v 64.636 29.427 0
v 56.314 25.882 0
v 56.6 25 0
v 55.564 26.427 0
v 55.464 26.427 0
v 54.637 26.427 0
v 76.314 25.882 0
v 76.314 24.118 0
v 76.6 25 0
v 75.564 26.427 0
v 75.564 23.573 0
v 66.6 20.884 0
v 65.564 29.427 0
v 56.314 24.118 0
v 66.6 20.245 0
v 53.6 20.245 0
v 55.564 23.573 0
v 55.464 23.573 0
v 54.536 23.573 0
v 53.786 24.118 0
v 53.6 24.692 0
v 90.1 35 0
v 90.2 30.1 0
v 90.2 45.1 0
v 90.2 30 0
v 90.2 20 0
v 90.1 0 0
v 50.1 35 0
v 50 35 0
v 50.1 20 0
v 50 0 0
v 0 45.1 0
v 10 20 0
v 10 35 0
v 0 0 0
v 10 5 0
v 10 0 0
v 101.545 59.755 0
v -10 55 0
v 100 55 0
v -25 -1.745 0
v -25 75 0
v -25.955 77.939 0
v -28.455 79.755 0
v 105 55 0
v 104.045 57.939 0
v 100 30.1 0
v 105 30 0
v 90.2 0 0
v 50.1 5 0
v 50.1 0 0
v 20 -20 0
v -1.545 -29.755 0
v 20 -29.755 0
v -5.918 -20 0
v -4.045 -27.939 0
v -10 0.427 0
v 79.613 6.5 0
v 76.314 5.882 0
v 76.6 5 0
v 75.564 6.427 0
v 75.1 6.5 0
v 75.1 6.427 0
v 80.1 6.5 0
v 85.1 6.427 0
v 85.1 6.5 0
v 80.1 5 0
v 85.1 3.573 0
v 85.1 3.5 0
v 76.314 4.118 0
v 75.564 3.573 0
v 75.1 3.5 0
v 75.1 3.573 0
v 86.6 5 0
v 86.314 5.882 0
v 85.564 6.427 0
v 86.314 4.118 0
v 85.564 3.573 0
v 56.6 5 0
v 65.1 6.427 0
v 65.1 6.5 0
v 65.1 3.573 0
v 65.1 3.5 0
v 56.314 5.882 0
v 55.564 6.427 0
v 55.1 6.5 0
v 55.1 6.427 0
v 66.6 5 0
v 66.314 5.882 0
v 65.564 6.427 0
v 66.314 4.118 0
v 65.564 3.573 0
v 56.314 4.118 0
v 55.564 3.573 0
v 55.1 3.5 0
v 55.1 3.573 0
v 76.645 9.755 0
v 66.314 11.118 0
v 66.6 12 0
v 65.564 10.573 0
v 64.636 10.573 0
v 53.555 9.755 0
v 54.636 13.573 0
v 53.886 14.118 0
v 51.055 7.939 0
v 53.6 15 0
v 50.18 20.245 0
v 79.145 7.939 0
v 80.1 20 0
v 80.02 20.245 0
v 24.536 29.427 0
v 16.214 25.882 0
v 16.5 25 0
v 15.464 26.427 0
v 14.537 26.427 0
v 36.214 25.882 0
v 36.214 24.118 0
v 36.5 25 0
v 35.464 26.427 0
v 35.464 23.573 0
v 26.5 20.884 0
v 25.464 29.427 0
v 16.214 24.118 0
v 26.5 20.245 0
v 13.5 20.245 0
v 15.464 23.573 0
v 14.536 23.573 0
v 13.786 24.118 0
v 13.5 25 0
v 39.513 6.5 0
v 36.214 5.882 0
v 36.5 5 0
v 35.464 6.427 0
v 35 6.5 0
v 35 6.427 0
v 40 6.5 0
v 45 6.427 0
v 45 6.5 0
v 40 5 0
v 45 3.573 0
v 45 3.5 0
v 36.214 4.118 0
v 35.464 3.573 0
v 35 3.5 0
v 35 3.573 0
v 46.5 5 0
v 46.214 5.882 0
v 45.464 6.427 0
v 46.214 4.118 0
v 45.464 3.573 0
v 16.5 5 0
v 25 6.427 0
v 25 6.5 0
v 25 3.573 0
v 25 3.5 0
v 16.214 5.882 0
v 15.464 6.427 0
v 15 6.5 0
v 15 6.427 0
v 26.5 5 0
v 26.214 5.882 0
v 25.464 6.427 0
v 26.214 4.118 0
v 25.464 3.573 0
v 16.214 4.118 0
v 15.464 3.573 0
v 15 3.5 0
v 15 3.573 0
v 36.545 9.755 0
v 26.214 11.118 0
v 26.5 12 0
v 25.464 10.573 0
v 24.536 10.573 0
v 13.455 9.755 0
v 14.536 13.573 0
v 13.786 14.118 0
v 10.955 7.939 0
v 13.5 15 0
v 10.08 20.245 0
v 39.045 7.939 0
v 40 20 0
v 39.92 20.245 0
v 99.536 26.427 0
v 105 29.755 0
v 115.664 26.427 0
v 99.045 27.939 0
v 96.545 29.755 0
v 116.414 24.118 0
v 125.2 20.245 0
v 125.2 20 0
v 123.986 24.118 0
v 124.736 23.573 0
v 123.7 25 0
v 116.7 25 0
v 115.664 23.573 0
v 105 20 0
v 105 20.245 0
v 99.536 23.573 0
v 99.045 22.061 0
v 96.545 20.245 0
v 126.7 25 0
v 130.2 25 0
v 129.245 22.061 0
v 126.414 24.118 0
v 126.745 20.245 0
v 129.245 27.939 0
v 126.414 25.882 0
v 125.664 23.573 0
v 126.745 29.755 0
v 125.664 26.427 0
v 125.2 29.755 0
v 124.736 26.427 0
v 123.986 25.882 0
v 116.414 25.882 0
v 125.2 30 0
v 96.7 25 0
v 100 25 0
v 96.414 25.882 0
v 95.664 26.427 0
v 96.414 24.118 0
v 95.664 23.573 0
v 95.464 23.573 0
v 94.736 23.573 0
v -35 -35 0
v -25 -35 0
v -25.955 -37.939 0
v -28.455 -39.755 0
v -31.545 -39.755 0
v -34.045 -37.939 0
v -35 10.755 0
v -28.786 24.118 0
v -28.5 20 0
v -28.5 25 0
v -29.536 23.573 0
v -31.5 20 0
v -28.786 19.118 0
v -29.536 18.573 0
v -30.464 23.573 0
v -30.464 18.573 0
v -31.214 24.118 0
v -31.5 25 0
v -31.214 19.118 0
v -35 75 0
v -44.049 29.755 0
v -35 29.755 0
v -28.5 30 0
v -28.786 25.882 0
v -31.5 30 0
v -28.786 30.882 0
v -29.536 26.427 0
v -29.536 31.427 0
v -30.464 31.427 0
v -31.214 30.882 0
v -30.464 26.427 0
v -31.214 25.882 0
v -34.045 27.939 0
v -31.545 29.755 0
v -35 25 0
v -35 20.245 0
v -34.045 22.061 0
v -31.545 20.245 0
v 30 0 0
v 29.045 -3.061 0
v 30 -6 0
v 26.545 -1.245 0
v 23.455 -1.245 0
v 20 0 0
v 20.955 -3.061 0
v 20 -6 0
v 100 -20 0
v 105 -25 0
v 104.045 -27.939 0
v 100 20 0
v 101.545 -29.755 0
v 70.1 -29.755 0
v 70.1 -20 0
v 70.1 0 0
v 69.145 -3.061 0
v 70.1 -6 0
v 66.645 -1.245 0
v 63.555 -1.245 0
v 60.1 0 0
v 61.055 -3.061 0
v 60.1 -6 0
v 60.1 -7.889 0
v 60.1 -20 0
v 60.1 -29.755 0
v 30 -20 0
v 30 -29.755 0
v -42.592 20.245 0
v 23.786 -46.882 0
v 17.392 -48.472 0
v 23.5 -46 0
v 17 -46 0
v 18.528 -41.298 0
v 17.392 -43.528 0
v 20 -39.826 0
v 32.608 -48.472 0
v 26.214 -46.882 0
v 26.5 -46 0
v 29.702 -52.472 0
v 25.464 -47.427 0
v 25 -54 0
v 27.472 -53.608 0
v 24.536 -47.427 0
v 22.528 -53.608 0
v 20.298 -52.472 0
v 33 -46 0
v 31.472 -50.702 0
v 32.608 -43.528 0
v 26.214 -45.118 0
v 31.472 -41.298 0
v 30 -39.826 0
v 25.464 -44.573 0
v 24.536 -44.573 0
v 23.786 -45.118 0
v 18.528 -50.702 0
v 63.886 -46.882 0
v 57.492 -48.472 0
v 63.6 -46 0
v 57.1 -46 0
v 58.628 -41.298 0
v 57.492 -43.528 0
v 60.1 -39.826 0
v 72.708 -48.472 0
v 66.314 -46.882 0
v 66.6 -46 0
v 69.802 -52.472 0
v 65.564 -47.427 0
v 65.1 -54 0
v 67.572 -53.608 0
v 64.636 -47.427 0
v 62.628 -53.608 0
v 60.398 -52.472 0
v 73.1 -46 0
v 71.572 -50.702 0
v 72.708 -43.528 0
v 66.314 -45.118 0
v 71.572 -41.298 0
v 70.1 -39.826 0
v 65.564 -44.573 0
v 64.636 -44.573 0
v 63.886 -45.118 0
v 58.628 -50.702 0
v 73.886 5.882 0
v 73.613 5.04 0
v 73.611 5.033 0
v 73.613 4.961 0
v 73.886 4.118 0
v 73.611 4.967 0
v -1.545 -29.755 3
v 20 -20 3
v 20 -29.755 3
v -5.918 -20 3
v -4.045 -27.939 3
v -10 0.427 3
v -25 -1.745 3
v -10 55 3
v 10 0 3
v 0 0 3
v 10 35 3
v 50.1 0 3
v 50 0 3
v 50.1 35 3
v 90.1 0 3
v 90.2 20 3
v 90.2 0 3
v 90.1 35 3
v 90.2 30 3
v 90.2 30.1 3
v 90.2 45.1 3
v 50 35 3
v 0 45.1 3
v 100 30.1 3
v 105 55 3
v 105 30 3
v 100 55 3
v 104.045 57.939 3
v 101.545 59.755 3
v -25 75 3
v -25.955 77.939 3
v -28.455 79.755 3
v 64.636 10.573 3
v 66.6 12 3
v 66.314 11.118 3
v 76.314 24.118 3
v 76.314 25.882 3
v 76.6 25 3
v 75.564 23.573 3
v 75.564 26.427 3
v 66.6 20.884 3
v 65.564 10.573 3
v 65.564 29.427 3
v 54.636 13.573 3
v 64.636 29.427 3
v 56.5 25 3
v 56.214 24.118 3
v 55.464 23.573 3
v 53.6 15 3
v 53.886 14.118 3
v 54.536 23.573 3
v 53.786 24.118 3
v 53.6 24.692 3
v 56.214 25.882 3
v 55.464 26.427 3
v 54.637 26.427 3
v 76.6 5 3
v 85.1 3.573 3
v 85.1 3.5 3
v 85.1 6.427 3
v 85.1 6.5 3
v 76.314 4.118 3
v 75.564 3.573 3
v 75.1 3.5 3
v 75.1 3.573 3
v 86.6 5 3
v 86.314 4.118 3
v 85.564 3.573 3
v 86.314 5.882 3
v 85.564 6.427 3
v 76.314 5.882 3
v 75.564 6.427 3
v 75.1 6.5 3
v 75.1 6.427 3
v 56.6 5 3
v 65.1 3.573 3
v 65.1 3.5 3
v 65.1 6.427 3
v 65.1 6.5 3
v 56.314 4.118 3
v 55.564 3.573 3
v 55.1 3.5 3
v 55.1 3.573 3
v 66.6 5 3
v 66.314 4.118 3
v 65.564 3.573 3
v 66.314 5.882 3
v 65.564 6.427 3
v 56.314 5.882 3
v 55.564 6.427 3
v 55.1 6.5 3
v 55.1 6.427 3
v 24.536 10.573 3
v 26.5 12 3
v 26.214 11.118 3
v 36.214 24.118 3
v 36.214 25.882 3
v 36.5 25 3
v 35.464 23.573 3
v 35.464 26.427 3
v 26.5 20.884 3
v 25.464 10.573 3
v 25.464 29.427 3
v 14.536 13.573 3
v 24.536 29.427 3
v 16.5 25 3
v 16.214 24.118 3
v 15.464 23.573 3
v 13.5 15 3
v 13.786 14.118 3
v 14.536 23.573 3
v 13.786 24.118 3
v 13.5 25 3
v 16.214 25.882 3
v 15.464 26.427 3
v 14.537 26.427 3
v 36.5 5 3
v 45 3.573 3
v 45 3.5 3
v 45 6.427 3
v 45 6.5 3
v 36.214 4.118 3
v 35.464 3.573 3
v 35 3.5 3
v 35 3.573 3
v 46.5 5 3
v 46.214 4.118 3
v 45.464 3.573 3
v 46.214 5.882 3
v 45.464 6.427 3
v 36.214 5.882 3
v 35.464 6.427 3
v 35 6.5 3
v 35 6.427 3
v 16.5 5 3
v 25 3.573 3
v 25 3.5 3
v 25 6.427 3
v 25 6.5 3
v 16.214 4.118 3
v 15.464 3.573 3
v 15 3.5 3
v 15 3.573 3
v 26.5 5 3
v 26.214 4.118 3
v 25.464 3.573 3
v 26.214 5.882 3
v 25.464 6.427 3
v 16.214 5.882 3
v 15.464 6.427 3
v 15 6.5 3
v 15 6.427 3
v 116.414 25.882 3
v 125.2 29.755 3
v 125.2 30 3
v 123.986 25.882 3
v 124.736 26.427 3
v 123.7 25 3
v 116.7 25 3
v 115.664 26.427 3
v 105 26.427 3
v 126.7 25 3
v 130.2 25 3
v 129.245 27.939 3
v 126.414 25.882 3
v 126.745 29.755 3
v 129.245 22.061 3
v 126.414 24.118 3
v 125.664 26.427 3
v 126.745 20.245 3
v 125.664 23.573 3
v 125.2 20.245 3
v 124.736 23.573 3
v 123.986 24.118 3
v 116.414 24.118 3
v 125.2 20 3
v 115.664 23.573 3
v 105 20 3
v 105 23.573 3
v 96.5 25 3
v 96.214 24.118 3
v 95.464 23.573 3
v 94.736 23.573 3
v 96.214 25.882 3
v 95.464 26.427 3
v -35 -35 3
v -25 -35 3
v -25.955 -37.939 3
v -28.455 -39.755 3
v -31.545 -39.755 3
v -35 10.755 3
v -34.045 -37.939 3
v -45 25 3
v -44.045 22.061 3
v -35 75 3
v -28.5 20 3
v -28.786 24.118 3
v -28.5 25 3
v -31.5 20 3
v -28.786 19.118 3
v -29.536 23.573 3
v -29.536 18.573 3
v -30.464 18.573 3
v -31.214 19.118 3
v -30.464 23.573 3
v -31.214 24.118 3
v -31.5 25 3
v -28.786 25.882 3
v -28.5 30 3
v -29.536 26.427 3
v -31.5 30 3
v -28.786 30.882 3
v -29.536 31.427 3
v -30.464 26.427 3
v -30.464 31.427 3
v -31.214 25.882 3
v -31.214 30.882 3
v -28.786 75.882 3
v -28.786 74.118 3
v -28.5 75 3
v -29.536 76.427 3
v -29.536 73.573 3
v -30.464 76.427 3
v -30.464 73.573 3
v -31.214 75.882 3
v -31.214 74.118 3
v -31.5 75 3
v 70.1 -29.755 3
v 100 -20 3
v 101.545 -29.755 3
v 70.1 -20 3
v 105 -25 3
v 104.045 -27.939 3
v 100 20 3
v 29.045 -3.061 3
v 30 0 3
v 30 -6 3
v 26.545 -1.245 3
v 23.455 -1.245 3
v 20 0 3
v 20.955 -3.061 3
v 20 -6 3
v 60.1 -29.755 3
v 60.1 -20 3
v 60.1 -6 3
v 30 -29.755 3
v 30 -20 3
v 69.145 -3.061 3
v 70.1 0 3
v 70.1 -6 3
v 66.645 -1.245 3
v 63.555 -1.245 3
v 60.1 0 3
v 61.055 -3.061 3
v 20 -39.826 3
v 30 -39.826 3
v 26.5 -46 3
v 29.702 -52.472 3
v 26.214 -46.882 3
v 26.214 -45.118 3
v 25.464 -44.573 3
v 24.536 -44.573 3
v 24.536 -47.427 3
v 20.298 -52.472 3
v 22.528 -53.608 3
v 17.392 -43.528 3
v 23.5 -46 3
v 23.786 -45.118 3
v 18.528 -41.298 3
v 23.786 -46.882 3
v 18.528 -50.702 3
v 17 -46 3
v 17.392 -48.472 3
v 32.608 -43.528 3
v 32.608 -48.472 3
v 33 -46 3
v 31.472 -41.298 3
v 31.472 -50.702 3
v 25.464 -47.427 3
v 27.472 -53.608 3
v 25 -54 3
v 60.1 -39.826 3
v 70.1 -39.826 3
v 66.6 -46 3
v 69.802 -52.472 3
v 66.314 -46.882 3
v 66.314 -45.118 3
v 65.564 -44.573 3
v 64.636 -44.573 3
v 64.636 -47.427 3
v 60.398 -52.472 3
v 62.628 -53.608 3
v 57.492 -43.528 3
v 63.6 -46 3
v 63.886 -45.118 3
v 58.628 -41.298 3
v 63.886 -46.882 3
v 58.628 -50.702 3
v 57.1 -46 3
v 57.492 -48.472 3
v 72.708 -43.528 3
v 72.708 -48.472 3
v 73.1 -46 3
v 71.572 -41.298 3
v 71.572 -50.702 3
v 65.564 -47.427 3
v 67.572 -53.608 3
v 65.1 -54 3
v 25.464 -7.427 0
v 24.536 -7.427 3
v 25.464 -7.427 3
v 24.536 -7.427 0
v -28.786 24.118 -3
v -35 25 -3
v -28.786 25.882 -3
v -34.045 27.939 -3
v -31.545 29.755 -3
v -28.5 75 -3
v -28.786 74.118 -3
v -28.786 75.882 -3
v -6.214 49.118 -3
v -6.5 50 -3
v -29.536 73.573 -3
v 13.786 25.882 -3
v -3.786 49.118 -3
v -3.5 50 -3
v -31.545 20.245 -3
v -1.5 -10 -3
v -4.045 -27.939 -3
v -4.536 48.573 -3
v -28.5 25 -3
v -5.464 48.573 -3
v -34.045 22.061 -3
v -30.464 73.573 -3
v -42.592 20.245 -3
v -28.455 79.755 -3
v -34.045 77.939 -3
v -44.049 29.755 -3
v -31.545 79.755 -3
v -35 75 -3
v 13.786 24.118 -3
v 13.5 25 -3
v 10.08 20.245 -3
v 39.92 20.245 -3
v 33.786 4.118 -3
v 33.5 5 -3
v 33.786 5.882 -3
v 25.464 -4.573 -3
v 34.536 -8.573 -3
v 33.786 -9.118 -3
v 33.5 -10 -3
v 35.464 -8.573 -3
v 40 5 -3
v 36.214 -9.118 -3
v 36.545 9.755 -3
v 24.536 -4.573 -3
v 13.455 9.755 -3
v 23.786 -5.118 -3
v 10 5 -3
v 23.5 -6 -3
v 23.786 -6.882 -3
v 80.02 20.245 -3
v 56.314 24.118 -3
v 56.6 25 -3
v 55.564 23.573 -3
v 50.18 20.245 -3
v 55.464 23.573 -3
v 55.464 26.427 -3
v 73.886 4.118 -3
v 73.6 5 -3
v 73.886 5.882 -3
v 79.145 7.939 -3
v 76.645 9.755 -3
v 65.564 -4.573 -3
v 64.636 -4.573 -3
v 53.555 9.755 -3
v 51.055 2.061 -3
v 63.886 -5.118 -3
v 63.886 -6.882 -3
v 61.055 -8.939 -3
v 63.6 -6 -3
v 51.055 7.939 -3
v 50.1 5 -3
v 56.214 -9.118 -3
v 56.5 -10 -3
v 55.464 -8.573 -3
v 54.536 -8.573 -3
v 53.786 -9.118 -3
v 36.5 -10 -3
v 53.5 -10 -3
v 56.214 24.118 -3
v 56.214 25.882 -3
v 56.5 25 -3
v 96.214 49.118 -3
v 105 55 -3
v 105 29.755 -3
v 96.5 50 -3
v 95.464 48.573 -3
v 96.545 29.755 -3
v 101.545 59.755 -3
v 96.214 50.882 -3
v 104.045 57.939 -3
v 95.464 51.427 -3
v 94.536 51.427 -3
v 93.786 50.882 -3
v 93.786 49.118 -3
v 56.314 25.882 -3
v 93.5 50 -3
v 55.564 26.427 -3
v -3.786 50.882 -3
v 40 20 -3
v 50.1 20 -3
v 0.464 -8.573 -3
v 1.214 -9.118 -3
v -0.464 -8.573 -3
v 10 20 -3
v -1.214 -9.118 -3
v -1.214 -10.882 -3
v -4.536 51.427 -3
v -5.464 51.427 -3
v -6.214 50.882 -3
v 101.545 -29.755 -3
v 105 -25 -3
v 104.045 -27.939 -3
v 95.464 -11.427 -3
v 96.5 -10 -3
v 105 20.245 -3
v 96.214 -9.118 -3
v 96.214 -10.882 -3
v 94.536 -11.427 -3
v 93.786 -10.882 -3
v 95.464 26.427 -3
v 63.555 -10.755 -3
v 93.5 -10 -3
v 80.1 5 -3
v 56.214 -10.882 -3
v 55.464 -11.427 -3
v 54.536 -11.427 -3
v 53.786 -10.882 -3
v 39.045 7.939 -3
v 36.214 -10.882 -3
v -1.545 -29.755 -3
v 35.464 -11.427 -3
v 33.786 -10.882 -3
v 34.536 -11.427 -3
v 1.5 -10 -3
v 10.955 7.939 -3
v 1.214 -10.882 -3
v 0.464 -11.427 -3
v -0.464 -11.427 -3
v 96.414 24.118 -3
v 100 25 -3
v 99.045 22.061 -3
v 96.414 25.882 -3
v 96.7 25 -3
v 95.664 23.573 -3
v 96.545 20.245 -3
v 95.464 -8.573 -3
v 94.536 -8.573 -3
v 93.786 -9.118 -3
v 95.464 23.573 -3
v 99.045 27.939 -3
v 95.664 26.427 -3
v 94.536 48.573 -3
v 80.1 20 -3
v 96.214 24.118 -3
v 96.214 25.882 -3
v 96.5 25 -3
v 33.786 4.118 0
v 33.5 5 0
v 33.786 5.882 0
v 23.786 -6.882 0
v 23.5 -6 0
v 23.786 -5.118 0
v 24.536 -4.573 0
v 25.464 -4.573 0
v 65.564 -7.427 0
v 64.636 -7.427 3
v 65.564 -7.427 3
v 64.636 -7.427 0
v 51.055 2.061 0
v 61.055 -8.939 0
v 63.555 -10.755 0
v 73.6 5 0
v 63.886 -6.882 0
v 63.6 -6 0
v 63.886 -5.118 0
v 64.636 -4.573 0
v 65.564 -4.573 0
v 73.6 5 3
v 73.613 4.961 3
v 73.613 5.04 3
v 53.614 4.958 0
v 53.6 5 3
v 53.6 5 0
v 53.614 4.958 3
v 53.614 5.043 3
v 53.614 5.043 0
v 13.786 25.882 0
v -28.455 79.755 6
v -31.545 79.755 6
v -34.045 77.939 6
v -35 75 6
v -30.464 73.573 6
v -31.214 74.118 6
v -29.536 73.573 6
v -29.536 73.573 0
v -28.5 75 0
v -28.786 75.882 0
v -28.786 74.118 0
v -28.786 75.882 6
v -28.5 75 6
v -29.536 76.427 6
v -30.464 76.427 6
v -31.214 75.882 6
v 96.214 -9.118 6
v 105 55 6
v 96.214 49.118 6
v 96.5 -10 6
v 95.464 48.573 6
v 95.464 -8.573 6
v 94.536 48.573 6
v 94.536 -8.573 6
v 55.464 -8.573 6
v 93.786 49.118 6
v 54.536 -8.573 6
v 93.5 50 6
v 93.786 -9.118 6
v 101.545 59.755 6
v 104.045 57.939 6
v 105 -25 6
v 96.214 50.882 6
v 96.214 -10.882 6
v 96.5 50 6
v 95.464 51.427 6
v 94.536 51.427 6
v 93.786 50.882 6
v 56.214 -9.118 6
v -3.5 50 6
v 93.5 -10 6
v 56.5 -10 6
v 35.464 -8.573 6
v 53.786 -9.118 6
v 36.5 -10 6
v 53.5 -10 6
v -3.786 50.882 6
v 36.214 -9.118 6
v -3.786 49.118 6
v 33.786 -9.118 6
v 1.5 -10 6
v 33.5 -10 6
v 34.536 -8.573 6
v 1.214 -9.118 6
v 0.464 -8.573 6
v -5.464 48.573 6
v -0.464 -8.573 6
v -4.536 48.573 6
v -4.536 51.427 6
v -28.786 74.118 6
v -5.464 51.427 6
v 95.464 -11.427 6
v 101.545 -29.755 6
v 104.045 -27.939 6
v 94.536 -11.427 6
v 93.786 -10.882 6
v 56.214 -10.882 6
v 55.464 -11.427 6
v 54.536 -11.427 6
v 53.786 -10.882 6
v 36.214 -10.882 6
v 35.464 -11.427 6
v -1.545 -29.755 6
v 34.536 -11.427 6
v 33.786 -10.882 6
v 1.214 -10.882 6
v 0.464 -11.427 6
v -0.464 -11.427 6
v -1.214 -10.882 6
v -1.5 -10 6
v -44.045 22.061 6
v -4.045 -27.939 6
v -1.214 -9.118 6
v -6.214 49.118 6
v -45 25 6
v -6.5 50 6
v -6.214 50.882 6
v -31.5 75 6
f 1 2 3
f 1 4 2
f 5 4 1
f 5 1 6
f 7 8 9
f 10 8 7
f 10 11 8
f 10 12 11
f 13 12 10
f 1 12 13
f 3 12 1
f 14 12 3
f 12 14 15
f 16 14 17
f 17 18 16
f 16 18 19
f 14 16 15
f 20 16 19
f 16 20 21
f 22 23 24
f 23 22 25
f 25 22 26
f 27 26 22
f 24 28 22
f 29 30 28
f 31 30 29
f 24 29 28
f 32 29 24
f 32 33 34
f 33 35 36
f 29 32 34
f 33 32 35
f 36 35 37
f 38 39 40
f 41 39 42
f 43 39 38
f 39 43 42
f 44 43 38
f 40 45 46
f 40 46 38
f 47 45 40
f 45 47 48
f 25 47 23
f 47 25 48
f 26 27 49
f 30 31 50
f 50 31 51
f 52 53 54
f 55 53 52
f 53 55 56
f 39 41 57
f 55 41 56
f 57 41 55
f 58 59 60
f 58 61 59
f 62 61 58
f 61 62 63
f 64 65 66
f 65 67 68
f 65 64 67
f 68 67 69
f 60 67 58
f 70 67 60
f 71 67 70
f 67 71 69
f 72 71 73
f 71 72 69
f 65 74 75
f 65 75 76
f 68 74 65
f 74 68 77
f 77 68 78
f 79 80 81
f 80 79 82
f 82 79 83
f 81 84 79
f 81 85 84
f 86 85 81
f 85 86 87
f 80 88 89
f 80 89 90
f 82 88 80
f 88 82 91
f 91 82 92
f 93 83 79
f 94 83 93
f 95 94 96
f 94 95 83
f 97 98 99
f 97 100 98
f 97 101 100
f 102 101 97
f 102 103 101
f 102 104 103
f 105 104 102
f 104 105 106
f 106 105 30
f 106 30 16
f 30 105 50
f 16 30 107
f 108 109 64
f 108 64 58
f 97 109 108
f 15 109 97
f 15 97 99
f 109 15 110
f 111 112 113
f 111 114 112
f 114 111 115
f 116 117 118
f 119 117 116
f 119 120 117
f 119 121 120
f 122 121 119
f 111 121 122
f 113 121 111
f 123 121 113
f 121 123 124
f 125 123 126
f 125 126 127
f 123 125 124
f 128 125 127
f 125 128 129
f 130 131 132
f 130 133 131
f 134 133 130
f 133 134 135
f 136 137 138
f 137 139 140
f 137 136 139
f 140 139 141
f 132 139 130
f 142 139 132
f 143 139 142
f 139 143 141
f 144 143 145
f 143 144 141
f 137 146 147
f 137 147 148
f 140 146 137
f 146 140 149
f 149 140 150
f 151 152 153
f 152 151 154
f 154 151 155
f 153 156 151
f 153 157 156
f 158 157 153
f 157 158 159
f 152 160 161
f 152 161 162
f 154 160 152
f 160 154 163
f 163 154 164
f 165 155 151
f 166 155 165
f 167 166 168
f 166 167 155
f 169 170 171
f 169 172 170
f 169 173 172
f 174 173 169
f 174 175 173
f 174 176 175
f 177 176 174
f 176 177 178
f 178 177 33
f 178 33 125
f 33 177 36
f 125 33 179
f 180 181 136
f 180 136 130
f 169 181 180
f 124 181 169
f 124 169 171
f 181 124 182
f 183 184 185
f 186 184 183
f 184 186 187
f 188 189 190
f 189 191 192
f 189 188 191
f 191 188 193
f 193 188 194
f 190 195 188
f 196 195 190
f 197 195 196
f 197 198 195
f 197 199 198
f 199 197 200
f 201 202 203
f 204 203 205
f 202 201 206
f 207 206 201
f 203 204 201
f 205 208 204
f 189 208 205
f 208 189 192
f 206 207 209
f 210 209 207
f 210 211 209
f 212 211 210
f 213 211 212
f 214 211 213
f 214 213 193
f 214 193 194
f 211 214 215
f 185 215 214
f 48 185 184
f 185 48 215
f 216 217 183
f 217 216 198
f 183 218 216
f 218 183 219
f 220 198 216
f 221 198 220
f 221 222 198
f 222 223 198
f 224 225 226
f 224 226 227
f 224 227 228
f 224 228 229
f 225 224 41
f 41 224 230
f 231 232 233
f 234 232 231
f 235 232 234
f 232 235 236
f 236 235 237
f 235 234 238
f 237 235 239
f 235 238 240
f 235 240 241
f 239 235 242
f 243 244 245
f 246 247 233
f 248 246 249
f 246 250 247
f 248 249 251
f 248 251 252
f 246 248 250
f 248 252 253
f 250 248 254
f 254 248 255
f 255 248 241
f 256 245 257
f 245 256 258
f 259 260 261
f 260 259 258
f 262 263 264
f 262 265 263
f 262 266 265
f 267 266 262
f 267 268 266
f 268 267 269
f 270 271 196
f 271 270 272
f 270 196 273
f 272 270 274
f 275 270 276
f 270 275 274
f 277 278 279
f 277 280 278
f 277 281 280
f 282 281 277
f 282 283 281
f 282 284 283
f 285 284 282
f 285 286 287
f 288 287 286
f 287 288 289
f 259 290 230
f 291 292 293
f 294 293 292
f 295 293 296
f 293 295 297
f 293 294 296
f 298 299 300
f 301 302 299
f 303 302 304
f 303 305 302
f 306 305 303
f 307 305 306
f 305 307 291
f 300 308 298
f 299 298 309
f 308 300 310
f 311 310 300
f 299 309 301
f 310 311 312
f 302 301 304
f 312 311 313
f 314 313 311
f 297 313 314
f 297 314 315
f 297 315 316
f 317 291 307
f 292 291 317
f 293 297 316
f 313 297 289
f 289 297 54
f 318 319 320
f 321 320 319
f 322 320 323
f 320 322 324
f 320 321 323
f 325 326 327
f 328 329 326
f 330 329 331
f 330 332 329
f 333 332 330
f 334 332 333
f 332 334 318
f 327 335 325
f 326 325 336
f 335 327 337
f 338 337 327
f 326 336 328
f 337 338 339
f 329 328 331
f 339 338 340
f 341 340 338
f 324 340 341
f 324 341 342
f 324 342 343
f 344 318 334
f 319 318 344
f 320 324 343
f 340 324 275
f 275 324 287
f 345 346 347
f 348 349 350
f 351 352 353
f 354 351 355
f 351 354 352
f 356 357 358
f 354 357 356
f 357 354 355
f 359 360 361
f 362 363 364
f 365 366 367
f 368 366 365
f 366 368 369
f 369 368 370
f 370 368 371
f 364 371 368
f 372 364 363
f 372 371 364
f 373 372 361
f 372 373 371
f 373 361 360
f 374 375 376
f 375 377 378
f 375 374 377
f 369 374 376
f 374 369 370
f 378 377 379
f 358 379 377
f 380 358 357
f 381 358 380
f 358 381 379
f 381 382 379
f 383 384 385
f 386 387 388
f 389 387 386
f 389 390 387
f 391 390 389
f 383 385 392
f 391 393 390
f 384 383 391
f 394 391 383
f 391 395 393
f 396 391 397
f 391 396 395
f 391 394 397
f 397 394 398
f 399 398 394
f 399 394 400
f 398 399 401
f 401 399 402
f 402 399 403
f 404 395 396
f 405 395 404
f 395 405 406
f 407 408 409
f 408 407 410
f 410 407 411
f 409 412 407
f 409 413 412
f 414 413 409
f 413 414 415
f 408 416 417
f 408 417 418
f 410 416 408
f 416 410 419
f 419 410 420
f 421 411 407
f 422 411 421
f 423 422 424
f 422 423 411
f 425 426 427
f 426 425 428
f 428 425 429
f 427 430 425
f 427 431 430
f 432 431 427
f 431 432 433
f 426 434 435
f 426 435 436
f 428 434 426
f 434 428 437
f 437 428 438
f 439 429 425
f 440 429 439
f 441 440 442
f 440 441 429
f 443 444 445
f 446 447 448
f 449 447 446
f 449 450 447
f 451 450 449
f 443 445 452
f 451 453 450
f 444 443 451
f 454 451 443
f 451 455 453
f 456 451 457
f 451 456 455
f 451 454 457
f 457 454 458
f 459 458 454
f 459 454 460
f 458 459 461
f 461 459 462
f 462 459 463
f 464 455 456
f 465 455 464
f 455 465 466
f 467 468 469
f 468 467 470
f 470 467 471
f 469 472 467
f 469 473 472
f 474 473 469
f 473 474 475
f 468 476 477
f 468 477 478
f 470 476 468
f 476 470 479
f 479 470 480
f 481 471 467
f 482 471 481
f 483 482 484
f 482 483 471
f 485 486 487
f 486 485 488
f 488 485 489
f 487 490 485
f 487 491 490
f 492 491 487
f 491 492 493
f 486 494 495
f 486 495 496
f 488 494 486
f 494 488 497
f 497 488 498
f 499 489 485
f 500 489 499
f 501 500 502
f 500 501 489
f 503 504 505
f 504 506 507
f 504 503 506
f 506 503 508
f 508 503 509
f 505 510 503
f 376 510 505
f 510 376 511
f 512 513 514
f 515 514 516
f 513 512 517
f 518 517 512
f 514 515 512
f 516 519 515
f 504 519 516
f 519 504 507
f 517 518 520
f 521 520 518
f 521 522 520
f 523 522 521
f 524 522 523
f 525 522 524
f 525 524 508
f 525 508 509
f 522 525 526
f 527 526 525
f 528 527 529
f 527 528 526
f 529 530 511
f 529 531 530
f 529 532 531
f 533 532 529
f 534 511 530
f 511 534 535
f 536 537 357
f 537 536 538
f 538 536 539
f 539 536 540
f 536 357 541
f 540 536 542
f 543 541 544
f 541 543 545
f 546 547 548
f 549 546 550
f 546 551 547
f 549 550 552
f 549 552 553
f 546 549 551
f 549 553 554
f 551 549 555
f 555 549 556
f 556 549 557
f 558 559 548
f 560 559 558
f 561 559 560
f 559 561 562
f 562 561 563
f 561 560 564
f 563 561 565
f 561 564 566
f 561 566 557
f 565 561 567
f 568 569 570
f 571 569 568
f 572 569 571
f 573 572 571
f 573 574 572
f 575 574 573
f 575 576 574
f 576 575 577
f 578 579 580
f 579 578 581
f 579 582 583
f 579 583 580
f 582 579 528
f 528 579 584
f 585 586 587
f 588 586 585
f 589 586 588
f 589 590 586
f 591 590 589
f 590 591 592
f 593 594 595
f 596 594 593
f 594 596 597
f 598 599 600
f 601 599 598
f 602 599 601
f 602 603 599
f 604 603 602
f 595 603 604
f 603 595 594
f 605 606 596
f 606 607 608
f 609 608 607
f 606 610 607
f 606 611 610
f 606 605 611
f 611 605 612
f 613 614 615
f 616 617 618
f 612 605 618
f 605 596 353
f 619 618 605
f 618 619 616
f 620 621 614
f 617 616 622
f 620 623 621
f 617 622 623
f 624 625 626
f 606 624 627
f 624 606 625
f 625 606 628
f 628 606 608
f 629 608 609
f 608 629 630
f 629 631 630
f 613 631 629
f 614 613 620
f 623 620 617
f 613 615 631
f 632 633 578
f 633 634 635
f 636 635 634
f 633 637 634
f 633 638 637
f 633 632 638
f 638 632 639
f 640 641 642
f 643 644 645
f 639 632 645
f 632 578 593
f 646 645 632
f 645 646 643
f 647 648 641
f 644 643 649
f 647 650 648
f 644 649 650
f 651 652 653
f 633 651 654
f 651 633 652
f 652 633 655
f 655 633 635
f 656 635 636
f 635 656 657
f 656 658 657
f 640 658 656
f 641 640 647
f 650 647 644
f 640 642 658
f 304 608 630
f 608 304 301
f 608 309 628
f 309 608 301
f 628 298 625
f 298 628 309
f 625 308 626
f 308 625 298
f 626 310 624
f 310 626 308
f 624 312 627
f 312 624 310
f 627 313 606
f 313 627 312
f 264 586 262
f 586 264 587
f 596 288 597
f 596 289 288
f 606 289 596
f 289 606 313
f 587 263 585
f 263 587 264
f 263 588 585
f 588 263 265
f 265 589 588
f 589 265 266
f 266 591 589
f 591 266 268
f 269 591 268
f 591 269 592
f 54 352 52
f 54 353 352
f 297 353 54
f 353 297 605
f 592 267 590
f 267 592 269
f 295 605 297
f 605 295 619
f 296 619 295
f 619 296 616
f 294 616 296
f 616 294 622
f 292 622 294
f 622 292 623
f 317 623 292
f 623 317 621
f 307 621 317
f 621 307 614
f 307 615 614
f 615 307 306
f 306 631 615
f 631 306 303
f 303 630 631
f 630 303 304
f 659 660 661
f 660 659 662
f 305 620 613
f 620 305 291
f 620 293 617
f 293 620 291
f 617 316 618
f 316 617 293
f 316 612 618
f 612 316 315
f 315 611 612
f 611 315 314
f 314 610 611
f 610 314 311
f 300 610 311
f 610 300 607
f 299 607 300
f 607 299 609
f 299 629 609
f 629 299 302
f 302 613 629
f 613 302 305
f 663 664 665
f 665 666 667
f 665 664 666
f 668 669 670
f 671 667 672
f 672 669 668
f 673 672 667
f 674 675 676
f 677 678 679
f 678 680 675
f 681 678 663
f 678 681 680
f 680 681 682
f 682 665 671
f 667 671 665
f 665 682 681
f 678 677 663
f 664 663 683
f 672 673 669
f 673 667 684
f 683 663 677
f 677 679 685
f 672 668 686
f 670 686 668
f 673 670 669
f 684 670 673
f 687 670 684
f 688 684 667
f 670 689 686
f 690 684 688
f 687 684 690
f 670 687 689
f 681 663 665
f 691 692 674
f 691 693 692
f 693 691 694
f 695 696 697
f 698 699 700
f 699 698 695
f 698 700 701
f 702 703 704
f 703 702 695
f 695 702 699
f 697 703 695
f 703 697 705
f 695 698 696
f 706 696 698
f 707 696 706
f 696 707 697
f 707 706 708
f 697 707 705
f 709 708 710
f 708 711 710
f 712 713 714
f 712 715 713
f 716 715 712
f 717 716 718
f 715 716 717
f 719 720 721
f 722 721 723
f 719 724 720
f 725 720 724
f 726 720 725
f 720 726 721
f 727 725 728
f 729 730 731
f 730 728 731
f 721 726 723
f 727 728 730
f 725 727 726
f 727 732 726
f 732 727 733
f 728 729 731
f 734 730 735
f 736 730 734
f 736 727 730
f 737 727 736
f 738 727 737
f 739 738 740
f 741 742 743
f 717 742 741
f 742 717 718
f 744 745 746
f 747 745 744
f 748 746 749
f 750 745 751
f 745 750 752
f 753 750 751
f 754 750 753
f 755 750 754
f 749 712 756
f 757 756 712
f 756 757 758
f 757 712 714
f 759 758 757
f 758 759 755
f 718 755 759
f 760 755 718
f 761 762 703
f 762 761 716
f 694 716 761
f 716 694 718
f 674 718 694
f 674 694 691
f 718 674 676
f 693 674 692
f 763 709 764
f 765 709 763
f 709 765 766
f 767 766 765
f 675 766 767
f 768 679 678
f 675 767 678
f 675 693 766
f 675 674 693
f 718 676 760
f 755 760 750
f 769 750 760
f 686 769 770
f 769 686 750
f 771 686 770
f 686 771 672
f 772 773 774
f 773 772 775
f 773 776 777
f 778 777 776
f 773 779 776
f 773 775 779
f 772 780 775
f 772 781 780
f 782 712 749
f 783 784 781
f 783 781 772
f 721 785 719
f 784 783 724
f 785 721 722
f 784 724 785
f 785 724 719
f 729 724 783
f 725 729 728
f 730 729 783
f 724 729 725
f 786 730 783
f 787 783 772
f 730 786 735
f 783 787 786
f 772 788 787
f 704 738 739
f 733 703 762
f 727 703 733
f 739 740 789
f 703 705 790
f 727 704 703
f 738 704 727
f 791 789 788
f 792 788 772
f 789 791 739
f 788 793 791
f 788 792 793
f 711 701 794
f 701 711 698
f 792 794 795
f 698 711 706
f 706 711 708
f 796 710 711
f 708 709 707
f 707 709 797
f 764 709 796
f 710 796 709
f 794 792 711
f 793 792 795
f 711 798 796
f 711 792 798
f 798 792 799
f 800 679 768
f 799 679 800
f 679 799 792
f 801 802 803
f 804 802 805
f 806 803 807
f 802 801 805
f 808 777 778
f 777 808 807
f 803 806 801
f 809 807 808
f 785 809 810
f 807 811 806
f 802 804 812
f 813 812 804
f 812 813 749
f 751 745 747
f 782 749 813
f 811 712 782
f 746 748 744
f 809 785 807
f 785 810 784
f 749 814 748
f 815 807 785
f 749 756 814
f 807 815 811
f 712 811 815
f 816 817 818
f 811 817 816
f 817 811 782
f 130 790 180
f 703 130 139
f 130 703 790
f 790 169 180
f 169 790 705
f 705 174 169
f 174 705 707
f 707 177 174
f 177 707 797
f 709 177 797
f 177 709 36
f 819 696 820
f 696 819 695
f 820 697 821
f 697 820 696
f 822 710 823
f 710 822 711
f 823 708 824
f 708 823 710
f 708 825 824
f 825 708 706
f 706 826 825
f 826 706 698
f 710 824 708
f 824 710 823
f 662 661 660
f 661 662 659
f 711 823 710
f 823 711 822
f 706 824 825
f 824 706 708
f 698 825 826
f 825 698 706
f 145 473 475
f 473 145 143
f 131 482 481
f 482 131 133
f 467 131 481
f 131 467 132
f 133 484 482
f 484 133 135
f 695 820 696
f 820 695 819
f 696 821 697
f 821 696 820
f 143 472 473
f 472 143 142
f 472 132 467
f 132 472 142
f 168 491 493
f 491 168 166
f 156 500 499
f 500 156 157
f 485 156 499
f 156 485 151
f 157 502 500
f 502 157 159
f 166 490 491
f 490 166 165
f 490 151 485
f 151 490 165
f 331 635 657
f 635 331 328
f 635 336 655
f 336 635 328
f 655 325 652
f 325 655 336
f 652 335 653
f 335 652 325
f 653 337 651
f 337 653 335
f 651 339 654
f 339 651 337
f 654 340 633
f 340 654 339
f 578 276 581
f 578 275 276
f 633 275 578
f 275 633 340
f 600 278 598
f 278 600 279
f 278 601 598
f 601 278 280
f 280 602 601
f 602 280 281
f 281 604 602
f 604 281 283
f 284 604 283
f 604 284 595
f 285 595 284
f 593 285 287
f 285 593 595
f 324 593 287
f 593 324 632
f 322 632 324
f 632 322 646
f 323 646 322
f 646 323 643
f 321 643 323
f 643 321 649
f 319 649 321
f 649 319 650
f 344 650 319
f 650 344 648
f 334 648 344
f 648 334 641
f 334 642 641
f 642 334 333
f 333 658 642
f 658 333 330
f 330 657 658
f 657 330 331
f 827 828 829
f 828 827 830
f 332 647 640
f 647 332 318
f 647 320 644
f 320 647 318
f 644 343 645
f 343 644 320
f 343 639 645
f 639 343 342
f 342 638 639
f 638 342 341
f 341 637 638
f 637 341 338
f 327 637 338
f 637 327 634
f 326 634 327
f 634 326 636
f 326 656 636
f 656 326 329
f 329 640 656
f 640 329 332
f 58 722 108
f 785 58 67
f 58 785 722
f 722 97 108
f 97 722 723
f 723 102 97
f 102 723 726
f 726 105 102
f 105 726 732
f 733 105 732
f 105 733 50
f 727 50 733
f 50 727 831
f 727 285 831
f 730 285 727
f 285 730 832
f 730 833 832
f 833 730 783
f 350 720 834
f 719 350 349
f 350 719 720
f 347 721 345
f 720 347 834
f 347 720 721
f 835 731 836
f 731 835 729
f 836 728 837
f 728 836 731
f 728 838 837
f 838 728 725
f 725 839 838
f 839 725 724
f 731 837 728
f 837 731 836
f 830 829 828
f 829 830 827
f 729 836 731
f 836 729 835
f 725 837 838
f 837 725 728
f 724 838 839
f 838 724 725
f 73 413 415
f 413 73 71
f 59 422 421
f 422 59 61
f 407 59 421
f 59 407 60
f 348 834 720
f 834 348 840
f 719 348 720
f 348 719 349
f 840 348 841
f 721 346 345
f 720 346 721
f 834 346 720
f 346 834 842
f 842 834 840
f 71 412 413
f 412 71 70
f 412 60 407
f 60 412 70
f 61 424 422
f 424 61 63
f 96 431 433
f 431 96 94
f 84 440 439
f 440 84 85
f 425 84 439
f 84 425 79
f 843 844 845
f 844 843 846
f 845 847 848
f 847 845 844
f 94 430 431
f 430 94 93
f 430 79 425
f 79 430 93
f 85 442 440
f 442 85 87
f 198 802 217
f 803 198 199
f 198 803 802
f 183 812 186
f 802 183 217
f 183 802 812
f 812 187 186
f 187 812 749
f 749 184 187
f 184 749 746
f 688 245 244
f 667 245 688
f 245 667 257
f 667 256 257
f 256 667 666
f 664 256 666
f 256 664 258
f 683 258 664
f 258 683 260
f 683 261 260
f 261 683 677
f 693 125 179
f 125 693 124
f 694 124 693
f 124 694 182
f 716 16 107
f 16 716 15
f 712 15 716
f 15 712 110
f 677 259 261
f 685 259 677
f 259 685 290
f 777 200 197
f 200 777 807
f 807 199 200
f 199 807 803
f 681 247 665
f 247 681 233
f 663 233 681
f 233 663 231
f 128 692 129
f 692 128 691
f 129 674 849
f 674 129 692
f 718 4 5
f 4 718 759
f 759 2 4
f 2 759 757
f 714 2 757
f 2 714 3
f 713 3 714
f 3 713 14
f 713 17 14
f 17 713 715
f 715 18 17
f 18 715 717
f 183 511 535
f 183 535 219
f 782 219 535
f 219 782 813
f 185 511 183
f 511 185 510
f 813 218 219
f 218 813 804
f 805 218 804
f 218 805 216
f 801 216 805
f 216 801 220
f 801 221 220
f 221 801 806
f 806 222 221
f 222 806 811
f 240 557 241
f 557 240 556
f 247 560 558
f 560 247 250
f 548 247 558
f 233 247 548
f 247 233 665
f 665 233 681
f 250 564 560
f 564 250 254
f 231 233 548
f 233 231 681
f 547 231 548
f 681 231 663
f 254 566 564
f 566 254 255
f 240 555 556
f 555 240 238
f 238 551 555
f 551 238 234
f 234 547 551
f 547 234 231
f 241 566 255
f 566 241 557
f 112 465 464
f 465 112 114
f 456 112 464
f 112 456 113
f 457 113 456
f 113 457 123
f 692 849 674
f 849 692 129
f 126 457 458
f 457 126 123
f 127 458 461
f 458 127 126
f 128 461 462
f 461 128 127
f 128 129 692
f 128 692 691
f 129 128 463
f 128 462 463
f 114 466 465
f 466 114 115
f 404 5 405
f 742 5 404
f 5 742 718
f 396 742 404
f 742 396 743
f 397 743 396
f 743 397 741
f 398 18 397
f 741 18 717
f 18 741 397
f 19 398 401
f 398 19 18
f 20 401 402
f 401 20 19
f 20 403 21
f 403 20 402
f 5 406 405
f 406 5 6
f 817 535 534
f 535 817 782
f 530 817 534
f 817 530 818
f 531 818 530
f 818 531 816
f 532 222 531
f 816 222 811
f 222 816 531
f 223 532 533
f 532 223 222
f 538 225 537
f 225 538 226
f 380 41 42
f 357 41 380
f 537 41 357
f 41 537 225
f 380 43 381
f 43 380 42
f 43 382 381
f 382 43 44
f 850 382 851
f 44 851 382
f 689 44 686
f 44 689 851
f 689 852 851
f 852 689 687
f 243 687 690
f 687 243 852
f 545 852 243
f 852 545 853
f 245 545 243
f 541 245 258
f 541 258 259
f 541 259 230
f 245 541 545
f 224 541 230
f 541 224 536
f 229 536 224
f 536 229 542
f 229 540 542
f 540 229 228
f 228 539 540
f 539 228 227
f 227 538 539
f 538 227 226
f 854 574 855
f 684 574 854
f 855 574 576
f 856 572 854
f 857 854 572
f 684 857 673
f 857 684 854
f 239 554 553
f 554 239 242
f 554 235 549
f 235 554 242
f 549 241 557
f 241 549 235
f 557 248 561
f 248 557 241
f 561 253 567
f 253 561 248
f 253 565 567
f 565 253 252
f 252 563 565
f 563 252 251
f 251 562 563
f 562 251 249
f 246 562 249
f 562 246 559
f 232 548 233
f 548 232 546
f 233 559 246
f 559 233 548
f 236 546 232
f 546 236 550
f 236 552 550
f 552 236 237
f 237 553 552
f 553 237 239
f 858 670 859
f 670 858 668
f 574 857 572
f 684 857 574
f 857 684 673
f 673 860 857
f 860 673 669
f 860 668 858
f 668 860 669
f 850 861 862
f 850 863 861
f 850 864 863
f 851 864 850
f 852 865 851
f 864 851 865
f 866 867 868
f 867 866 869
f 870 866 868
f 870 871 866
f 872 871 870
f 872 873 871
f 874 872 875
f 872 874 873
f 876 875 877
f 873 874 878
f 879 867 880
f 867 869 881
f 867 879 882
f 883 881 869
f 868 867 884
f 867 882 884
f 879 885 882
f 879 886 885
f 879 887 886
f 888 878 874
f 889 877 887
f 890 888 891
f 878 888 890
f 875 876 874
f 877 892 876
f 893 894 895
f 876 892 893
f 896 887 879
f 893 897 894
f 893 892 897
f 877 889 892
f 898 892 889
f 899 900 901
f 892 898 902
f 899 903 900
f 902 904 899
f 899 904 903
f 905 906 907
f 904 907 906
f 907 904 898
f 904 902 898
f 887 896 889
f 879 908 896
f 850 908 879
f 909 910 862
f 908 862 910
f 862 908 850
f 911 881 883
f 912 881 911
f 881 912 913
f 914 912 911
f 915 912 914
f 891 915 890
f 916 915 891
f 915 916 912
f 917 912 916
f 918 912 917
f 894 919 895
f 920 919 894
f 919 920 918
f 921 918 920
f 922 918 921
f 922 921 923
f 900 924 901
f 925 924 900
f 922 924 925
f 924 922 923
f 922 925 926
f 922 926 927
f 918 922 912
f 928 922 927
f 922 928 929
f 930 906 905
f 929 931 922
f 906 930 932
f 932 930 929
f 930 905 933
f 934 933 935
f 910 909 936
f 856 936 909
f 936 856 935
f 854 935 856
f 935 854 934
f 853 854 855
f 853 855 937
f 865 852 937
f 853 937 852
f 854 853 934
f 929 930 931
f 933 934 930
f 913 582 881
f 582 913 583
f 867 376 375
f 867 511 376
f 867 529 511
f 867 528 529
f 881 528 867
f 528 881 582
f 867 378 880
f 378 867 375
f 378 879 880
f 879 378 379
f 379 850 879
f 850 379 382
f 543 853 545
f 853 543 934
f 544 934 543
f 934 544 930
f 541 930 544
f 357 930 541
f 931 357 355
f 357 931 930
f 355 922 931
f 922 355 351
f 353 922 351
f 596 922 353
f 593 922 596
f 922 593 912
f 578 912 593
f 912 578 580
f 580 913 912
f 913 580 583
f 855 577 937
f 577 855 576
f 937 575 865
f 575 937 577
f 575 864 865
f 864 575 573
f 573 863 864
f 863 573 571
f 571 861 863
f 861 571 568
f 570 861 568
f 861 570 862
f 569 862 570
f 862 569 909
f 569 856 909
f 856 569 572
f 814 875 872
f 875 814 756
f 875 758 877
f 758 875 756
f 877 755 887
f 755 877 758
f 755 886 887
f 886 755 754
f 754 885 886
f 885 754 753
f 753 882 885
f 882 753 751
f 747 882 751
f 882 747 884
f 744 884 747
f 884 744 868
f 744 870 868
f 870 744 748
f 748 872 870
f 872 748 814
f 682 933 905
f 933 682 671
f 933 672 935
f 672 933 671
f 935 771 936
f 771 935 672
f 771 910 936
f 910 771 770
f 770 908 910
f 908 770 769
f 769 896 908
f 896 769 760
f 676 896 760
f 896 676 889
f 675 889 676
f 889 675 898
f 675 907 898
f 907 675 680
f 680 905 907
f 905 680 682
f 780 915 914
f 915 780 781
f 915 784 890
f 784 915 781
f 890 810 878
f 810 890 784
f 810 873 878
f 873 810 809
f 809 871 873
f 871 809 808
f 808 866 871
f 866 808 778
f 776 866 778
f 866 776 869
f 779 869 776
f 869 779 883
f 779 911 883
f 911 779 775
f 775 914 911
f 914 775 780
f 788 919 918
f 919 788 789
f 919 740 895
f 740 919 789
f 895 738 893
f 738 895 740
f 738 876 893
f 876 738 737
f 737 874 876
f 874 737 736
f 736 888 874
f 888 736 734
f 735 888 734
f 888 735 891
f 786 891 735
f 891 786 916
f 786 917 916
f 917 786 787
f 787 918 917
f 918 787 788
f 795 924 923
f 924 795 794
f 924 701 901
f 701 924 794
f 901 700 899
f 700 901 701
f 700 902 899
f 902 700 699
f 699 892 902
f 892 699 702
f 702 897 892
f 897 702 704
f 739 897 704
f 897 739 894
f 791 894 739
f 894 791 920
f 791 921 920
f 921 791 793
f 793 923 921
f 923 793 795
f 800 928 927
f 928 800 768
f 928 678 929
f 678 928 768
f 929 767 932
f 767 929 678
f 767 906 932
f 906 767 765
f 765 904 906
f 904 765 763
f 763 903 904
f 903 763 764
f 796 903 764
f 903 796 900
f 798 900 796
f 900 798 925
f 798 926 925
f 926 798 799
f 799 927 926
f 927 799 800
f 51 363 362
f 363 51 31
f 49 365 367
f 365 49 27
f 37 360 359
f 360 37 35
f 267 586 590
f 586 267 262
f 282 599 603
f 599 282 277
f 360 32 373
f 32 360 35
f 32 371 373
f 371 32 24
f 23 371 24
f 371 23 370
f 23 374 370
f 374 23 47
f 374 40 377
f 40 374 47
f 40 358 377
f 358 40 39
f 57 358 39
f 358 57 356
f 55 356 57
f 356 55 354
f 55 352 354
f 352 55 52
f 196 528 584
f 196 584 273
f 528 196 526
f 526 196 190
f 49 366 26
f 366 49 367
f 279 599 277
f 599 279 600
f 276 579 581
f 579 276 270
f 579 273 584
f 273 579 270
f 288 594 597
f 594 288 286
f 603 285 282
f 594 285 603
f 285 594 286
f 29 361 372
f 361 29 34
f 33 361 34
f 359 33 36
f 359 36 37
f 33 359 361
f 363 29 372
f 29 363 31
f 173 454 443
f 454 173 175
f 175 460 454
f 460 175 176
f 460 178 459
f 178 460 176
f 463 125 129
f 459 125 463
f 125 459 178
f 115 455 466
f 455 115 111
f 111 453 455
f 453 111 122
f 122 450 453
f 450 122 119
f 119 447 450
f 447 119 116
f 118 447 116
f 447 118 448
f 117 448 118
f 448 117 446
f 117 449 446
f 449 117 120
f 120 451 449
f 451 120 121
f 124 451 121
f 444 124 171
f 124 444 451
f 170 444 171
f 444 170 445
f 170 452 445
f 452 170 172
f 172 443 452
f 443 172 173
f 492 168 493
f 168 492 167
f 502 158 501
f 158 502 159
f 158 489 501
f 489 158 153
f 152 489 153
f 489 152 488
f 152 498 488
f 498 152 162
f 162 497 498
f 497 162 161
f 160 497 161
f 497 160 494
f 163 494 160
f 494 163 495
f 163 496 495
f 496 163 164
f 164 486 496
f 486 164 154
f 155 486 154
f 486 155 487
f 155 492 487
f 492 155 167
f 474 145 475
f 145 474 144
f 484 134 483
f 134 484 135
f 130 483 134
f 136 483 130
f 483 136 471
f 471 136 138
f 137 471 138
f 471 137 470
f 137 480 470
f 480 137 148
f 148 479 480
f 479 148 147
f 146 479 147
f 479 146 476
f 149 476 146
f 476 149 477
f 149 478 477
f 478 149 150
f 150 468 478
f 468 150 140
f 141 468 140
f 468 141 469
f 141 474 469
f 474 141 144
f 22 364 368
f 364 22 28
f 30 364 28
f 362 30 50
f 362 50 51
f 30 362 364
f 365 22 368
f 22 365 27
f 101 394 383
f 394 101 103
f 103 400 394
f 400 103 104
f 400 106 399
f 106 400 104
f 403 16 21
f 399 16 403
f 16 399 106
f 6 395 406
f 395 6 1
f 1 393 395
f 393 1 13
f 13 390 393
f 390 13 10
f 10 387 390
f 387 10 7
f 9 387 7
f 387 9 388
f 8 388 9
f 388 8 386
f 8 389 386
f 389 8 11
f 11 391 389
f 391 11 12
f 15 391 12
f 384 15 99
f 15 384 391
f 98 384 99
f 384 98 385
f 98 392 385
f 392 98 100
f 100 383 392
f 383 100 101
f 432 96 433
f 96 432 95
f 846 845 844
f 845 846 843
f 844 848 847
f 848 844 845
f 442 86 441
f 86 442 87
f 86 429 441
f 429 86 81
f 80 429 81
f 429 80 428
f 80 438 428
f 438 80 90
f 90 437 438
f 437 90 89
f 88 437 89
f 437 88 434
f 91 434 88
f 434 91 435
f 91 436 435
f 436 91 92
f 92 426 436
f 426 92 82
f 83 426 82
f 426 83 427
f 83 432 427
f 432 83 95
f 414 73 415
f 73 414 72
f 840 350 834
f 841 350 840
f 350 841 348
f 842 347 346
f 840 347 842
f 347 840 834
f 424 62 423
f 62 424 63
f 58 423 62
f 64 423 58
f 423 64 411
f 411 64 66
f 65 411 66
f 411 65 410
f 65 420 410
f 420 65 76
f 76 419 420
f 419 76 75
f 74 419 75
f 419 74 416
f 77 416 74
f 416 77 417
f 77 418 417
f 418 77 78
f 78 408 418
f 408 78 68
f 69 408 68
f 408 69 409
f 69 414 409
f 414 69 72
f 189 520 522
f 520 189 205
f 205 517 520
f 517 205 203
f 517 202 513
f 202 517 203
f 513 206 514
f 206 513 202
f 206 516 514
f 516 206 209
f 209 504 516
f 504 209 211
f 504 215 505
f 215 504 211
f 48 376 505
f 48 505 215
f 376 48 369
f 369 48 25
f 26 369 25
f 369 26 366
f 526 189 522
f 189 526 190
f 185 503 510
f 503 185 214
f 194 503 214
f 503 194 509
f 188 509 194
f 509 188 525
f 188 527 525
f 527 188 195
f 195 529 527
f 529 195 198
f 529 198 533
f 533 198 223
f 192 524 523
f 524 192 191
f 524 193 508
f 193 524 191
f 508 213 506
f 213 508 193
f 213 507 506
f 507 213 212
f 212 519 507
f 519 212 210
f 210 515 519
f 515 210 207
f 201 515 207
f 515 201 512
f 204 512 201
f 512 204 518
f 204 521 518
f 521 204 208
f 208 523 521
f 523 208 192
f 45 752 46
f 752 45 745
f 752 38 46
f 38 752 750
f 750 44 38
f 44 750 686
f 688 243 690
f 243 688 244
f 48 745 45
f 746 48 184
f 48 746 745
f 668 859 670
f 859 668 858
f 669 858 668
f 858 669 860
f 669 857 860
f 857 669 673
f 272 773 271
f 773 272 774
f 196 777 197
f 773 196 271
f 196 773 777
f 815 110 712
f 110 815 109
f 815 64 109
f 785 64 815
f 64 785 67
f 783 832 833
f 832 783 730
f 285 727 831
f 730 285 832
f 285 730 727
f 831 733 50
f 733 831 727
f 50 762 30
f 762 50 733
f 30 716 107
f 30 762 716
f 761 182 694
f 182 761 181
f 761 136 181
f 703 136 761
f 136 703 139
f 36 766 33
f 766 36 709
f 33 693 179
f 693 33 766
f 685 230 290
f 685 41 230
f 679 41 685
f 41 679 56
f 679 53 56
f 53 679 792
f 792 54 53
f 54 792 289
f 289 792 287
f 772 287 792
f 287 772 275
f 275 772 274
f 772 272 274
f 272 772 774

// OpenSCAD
// file: orgate-twolayer.scad
$fn=10;
	
slotWidth = 3;
travel = 10;
clear = 0.1;
tolerance = 3;
sliderWidth = 40;
sliderHeight = 35;
inputLeverLen = 100;

module inputGateSlot()
{
  union() {
    circle(r=slotWidth/2);
    translate([travel,0]) circle(r=slotWidth/2);
    translate([0,-slotWidth/2]) square([travel,slotWidth]);
  }
}

module inputPasser(slot0, slot1)
{
  union() {
    hull() {
      translate([0,0]) circle(r=slotWidth/2);
      translate([0,travel]) circle(r=slotWidth/2);
      translate([travel,0-tolerance]) circle(r=slotWidth/2);
      translate([travel,travel+tolerance]) circle(r=slotWidth/2);
    }
    if(slot0 == 1) {
       hull() {
         translate([travel,0+tolerance]) circle(r=slotWidth/2);
         translate([travel,0-tolerance]) circle(r=slotWidth/2);
         translate([travel*2,0]) circle(r=slotWidth/2);
       }
    }
    if(slot1 == 1) {
       hull() {
       translate([travel,travel-tolerance]) circle(r=slotWidth/2);
       translate([travel,travel+tolerance]) circle(r=slotWidth/2);
       translate([travel*2,travel]) circle(r=slotWidth/2);
       }
    }
  }
}

module slider(slot0, slot1) {
  difference() {
    square([sliderWidth,sliderHeight]);
    translate([5,5]) inputGateSlot();
    translate([travel+15,5]) inputGateSlot();
    translate([5,15]) inputPasser(slot0, slot1);
  } 
}

module driverod() {
  difference() {
    hull() {
      translate([-30,0]) circle(r=5);
      translate([95,0]) circle(r=5);
    }   
    translate([-30,0]) circle(r=slotWidth/2);
    translate([5+travel,0]) circle(r=slotWidth/2);
    translate([sliderWidth+clear+5+travel,0]) circle(r=slotWidth/2);
    translate([sliderWidth*2+clear*2+5+travel,0]) circle(r=slotWidth/2);
  }
} 

module outputRod() {
  difference() {
    union() {
      square([35,10]);
      translate([35,5])circle(r=5);
    }
    hull() {
      translate([5,5]) circle(r=slotWidth/2);
      translate([5+travel*2,5]) circle(r=slotWidth/2);
    }
    translate([5+travel*3,5]) circle(r=slotWidth/2);
  }
}

module cell1() {
  slider(0,1);
}

module cell2() {
  translate([sliderWidth+clear,0]) slider(0,1);
}

module inputBridge() {
  difference() {
      hull() {
      translate([0,0]) circle(r=5);
      translate([travel+10,0]) circle(r=5);
      translate([travel/2+5,-11]) circle(r=5);
    }
    translate([travel/2+5,-11]) circle(r=slotWidth/2);
    translate([travel+10,0]) circle(r=slotWidth/2);
    translate([0,0]) circle(r=slotWidth/2);
  }
}

module inputRod() {
  difference() {
    union() {
      hull() {
	translate([0,-10]) circle(r=5);
	translate([0,30]) circle(r=5);
      }
      translate([0,-10]) circle(r=8, $fn=20);
    }
    translate([0,-10]) circle(r=slotWidth/2);
    translate([0,30]) circle(r=slotWidth/2);
  }
}



module inputLever() {
  translate([0,-inputLeverLen]) {
  difference() {
    hull() {
      translate([0,-10]) circle(r=5);
      translate([0,inputLeverLen]) circle(r=5);
    }
    translate([0,inputLeverLen]) circle(r=slotWidth/2);
    hull() {
      translate([0,45]) circle(r=slotWidth/2);
      translate([0,55]) circle(r=slotWidth/2);
    }
  }
  }
}


module caseHoles() {
    translate([95,-10]) circle(r=slotWidth/2);
    translate([95,50]) circle(r=slotWidth/2);
    translate([-5,50]) circle(r=slotWidth/2);

    translate([55,-10]) circle(r=slotWidth/2);
    translate([35,-10]) circle(r=slotWidth/2);
    translate([0,-10]) circle(r=slotWidth/2);
}

module case1() {
  difference() {
   translate([-10,-20]) square(size=[110,75]);
   square(size=[sliderWidth*2+clear*2+travel,sliderHeight+travel+clear]); // Central section
   translate([sliderWidth*2+clear*2,10+travel]) square(size=[100,10+clear]);
   for(i=[0:1]) {
     translate([10+travel+(sliderWidth+clear)*i,-30]) square(size=[10,50]); // Holes for input levers
   }
   translate([-30,inputLeverLen+5+travel*2-50]) rotate(11.3) inputLever();
   caseHoles();
  }
}

module basePlate() {
  difference() {
  hull() {
    translate([0,-25]) circle(r=5);
    translate([-40,25]) circle(r=5);
    translate([100,-25]) circle(r=5);
    translate([100,55]) circle(r=5);
    translate([-30,75]) circle(r=5);
  }
    translate([-30,75]) circle(r=slotWidth/2);
    caseHoles();
   }

}

module topPlate() {
  fudge=5;
  difference() {
    basePlate();
    for(i=[0:1]) {
      translate([5+i*(sliderWidth+clear),5]) {
	hull() {
	  for(v=[0:1]) {
	    translate([travel,v*(travel+fudge)]) inputBridge();
	  }
	}
      }
    }
   hull() {
      translate([-5,5+travel*2]) {
     for(v=[0:1]) {
       translate([v*(2*travel+fudge)-10,0]) driverod();
      }
     }
   }
    translate([-30,75]) circle(r=slotWidth/2);
    caseHoles();
  }
}
// main file
include <orgate-twolayer.scad>

// Animation variables
phase = ($t*4.0)%1.0;
PI=3.1415;
anim_driveRod = (phase < 0.8) ? -travel*sin(phase*1.25*360) : 0;
anim_driveLever = (phase < 0.8) ? -11.37*sin(phase*1.25*360) : 0;

input1 = ($t < 0.5)? 0: 1;
input2 = ($t % 0.5 < 0.25)?0:1;

old_time = ($t + 0.75) % 1.0;
next_time = ($t + 0.25) % 1.0;

prev_input1 = (old_time < 0.5)? 0: 1;
prev_input2 = (old_time % 0.5 < 0.25)? 0: 1;

next_input1 = (next_time < 0.5)? 0: 1;
next_input2 = (next_time % 0.5 < 0.25)? 0: 1;

input_either = (input1 + input2 > 0)?1:0;
prev_input_either = (prev_input1 + prev_input2 > 0)?1:0;

// In 'phase 5' blend between 
blend = 5*(phase - 0.8);
antiblend = 1-blend;
gate1v = phase > 0.8 ? (blend*next_input1 + antiblend*input1) : input1;
gate2v = phase > 0.8 ? (blend*next_input2 + antiblend*input2) : input2;

anim_gates = (phase < 0.20)? anim_driveRod + travel :
  (phase < 0.40) ? 0:
  (phase < 0.60) ? anim_driveRod:
  travel;

anim_gate1 = (phase < 0.4) ? anim_gates * prev_input1 : anim_gates * input1;
anim_gate2 = (phase < 0.4) ? anim_gates * prev_input_either : anim_gates * input_either;

anim_output = anim_gate2;


// Add dowels?
module dowel() {
  color([1,1,0]) translate([0,0,0]) cylinder(d=3,h=6);
}

// Acutal objects

translate([0,0,3]) color([0.5,0.5,0.5]) linear_extrude(height=3) basePlate();

color([0.0,0.8,0]) linear_extrude(height=3) case1();
translate([anim_gate1,travel*gate1v,0]) color([1.0,0,0]) linear_extrude(height=3) cell1();
translate([anim_gate2,travel*gate2v,0]) color([1.0,0,0]) linear_extrude(height=3) cell2();

translate([anim_output+sliderWidth*2+clear*2,15+travel-5]) linear_extrude(height=3) outputRod();  

translate([5+travel, 0, 0]) {
  translate([0,travel*gate1v,0]) {
    translate([10,-36,00]) color([0.0,0.0,1.0])  linear_extrude(height=3) inputRod();
    translate([0,5,-3]) color([0.0,0.5,1.0,0.5])  linear_extrude(height=3) inputBridge();
    translate([10,-6,-3]) dowel();
    translate([20,5,-3]) dowel();
    translate([0,5,-3]) dowel();

  }
  translate([sliderWidth+clear,travel*gate2v,0]) {
    translate([10,-36,0]) color([0.0,0.0,1.0])  linear_extrude(height=3) inputRod();
    translate([0,5,-3]) color([0.0,0.5,1.0,0.5])  linear_extrude(height=3) inputBridge();
    translate([10,-6,-3]) dowel();
    translate([20,5,-3]) dowel();
    translate([0,5,-3]) dowel();
  }
}
translate([anim_driveRod,5+travel*2,-3]) {
  color([0,0,1.0,0.5]) linear_extrude(height=3) driverod(); 
  translate([-30,0,0]) dowel();
  translate([15,0,0]) dowel();
  translate([55,0,0]) dowel();
  translate([95,0,0]) dowel();
}

translate([-30,5+travel*2-50,0])  translate([0,inputLeverLen])  {
  color([0,0,1.0]) linear_extrude(height=3) rotate([0,0,anim_driveLever]) inputLever();
  translate([0,0,-3]) dowel();
}

translate([0,0,-3]) color([0.5,0.5,0.5,0.5]) linear_extrude(height=3) topPlate();
//translate([0,0,-6]) color([0.5,0.5,0.5,0.1]) linear_extrude(height=3) basePlate();
